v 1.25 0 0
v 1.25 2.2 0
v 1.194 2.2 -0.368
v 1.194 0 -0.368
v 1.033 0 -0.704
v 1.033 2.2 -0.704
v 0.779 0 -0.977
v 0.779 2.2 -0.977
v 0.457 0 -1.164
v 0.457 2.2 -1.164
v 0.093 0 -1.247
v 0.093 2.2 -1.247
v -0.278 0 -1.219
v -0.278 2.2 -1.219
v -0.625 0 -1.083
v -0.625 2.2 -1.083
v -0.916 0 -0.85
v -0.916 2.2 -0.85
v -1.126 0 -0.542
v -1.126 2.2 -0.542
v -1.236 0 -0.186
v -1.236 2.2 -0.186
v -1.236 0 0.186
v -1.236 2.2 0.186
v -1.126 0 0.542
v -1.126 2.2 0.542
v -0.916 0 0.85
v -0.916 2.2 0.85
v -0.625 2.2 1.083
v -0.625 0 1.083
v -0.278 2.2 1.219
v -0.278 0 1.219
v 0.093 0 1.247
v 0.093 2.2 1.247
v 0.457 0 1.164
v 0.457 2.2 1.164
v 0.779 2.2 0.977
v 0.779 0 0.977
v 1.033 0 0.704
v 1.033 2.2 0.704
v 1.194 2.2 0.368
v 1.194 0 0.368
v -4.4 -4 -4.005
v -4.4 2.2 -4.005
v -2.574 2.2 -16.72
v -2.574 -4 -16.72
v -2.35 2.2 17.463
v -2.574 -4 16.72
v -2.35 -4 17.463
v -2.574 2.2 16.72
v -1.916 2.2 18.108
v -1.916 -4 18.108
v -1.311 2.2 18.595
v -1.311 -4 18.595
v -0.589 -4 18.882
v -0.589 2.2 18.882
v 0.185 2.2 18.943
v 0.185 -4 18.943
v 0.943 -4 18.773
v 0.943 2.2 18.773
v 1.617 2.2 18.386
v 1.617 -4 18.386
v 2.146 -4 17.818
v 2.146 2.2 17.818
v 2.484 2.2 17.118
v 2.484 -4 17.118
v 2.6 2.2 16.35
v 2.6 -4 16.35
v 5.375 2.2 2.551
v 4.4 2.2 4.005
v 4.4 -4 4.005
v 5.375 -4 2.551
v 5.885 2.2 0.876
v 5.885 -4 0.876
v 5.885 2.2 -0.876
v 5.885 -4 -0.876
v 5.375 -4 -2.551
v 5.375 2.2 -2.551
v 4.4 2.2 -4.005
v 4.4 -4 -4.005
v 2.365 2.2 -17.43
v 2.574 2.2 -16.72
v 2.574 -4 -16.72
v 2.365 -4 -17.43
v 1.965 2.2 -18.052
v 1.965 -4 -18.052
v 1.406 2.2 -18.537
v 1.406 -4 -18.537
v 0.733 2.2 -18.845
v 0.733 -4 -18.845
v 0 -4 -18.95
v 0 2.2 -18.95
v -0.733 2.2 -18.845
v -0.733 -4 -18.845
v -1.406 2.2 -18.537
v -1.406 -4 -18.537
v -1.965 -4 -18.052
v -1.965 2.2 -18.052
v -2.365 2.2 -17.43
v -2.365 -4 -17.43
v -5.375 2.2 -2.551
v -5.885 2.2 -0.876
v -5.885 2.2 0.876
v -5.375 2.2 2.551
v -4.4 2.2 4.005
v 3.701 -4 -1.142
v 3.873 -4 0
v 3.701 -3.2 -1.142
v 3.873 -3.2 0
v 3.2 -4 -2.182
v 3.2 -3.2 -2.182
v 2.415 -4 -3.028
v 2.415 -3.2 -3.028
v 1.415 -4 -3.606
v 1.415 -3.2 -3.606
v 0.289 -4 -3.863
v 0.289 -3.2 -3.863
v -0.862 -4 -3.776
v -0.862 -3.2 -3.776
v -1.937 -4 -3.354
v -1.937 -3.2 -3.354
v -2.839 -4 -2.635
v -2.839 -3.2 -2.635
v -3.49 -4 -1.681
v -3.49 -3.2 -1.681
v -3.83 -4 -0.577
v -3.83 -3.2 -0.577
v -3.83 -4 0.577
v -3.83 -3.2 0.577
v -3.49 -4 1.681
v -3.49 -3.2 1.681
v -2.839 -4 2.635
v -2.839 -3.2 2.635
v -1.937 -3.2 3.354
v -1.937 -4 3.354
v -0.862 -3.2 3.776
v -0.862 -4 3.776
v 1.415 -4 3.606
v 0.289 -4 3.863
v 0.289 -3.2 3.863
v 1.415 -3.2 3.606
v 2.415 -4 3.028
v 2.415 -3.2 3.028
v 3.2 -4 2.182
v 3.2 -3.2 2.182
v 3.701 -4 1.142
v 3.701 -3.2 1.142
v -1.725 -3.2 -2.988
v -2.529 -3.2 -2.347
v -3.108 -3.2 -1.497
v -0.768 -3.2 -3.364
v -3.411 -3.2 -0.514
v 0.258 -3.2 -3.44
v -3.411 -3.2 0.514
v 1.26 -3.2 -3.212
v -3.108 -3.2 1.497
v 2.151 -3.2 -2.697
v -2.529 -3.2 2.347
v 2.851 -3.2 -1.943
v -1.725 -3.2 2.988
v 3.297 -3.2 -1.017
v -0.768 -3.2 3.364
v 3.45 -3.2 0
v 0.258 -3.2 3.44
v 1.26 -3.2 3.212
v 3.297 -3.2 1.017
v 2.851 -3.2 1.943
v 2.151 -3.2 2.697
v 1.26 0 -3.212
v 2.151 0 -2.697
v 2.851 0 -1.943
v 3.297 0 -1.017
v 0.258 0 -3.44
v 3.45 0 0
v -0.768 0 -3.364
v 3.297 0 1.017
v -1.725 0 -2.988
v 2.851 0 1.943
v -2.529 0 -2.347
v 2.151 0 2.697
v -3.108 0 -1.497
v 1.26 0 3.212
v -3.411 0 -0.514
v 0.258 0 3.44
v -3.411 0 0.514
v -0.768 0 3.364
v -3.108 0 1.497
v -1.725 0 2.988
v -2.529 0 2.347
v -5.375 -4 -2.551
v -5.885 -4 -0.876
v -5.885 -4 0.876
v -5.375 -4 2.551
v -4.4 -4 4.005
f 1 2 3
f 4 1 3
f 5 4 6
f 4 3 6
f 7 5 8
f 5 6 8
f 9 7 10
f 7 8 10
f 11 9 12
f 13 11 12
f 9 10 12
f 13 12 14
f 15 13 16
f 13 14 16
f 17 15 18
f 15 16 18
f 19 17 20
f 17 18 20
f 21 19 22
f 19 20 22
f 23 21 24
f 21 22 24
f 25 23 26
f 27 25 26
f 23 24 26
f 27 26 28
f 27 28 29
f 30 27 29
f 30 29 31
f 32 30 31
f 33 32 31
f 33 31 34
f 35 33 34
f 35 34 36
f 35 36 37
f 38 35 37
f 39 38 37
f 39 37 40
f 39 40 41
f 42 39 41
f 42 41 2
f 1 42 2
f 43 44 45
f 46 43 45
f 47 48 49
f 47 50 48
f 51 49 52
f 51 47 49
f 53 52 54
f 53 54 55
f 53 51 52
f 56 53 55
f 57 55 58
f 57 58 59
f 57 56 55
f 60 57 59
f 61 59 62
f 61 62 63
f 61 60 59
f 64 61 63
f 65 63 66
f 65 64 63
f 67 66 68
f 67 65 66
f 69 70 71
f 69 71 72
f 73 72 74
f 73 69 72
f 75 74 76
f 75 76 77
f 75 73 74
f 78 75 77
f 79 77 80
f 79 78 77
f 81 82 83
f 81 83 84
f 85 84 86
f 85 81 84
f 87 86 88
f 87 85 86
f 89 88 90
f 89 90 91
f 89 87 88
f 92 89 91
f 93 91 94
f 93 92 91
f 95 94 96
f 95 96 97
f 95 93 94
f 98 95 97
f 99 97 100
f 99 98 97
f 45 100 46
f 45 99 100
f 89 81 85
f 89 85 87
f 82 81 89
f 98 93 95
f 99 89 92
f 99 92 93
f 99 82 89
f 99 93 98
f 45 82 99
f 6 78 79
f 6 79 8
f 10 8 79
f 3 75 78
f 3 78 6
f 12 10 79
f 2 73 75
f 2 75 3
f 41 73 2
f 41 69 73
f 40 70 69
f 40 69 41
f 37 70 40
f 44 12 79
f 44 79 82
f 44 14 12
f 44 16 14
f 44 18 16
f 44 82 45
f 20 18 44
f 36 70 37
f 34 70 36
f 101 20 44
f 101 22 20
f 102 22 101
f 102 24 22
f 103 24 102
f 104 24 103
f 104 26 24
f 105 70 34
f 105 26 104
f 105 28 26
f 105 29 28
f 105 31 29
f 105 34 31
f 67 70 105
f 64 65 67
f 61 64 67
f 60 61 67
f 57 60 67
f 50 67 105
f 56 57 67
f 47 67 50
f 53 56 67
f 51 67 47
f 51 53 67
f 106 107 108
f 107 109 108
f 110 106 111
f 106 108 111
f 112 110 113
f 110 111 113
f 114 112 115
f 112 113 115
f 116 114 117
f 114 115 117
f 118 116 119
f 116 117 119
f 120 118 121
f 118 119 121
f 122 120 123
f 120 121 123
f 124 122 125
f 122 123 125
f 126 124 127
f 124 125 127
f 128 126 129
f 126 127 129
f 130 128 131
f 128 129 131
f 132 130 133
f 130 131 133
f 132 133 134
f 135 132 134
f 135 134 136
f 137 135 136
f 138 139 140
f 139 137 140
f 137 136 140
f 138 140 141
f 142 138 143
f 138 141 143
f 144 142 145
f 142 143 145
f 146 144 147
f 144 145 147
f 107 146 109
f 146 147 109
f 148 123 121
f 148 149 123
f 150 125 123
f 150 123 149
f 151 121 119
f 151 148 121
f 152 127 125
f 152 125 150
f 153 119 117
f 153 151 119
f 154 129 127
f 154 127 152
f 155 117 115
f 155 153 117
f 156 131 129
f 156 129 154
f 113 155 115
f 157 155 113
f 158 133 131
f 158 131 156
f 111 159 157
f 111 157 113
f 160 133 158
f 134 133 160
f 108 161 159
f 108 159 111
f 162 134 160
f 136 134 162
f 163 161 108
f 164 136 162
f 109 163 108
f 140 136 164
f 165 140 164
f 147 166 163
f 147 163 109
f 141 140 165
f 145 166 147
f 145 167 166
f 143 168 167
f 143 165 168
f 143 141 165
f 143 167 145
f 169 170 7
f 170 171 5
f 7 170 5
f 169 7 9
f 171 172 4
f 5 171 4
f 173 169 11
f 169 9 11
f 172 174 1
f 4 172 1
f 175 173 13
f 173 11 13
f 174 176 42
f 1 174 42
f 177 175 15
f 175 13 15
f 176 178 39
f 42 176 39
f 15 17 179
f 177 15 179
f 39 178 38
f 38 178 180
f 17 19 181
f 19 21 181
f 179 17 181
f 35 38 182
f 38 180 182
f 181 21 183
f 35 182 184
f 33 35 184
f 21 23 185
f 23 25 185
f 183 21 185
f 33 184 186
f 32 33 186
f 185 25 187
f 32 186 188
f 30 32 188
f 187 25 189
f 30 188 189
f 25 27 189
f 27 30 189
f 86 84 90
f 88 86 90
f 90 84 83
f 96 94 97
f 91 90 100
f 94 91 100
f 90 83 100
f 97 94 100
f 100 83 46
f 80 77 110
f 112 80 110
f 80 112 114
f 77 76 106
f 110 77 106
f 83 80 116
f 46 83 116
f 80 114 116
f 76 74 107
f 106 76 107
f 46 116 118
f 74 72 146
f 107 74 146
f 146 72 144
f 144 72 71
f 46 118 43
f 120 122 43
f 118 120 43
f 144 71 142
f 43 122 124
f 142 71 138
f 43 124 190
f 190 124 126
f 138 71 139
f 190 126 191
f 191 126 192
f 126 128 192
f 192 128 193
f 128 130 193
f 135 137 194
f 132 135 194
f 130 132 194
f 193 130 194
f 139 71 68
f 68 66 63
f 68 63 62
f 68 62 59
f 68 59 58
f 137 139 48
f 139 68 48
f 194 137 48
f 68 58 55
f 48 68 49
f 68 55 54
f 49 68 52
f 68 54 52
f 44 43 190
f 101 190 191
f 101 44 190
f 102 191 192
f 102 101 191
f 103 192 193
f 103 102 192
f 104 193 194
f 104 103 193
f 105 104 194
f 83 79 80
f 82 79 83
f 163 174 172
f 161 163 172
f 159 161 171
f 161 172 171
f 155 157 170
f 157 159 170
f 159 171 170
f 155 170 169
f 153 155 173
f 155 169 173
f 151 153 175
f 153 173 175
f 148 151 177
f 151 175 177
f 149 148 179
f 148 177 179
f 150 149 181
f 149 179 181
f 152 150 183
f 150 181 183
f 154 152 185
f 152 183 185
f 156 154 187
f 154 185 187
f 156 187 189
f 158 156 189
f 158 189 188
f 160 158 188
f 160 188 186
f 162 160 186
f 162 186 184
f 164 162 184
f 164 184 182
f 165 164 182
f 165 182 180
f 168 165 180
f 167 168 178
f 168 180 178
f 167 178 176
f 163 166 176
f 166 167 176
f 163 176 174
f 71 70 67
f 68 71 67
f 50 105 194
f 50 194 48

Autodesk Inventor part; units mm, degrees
ref_plane "YZ Plane" through (0, 0, 0) normal (1, 0, 0) x (0, 1, 0)
ref_plane "XZ Plane" through (0, 0, 0) normal (0, 1, 0) x (-1, 0, 0)
ref_plane "XY Plane" through (0, 0, 0) normal (0, 0, 1) x (1, 0, 0)
sketch "Sketch1" plane through (0, 0, 0) normal (0, 1, 0) x (-1, 0, 0)
  circle A0 centre (0, 0) radius 5.95
  circle A1 centre (0, -16.35) radius 2.6
  line L0 (4.4, -4.0053) -> (2.5736, -16.7197)
  circle A2 centre (0, 16.35) radius 2.6
  line L1 (4.4, 4.0053) -> (2.5736, 16.7197)
  line L2 (-4.4, 4.0053) -> (-2.6, 16.35)
  line L3 (-4.4, -4.0053) -> (-2.5736, -16.7197)
  dimension "d0" = 11.9
  dimension "d1" = 5.2
  dimension "d2" = 4.4
  dimension "d3" = 5.2
  dimension "d4" = 16.35
  dimension "d5" = 16.35
  dimension "d6" = 4.4
  dimension "d7" = 4.4
  dimension "d8" = 4.4
  dimension "d9" = 0
extrude "Extrusion1" add sketch "Sketch1" along normal blind 2.2
sketch "Sketch2" plane through (0, 0, 0) normal (0, -1, 0) x (1, 0, 0)
  circle A0 centre (0, 0) radius 3.8734
  circle A1 centre (0, 0) radius 3.45
  dimension "d12" = 6.9
extrude "Extrusion2" add sketch "Sketch2" along normal blind 3.2
sketch "Sketch3" plane through (0, 2.2, 0) normal (0, 1, 0) x (1, 0, 0)
  circle A0 centre (0, 0) radius 1.25
  dimension "d15" = 2.5
extrude "Extrusion3" cut sketch "Sketch3" against normal blind 2.2
thicken "Thicken2" operation add thickness 4 both sides no extend neighbours no toward (0, -1, 0) faces at (0.1556, 0, -12.4282)
properties part number "servo_attach"
